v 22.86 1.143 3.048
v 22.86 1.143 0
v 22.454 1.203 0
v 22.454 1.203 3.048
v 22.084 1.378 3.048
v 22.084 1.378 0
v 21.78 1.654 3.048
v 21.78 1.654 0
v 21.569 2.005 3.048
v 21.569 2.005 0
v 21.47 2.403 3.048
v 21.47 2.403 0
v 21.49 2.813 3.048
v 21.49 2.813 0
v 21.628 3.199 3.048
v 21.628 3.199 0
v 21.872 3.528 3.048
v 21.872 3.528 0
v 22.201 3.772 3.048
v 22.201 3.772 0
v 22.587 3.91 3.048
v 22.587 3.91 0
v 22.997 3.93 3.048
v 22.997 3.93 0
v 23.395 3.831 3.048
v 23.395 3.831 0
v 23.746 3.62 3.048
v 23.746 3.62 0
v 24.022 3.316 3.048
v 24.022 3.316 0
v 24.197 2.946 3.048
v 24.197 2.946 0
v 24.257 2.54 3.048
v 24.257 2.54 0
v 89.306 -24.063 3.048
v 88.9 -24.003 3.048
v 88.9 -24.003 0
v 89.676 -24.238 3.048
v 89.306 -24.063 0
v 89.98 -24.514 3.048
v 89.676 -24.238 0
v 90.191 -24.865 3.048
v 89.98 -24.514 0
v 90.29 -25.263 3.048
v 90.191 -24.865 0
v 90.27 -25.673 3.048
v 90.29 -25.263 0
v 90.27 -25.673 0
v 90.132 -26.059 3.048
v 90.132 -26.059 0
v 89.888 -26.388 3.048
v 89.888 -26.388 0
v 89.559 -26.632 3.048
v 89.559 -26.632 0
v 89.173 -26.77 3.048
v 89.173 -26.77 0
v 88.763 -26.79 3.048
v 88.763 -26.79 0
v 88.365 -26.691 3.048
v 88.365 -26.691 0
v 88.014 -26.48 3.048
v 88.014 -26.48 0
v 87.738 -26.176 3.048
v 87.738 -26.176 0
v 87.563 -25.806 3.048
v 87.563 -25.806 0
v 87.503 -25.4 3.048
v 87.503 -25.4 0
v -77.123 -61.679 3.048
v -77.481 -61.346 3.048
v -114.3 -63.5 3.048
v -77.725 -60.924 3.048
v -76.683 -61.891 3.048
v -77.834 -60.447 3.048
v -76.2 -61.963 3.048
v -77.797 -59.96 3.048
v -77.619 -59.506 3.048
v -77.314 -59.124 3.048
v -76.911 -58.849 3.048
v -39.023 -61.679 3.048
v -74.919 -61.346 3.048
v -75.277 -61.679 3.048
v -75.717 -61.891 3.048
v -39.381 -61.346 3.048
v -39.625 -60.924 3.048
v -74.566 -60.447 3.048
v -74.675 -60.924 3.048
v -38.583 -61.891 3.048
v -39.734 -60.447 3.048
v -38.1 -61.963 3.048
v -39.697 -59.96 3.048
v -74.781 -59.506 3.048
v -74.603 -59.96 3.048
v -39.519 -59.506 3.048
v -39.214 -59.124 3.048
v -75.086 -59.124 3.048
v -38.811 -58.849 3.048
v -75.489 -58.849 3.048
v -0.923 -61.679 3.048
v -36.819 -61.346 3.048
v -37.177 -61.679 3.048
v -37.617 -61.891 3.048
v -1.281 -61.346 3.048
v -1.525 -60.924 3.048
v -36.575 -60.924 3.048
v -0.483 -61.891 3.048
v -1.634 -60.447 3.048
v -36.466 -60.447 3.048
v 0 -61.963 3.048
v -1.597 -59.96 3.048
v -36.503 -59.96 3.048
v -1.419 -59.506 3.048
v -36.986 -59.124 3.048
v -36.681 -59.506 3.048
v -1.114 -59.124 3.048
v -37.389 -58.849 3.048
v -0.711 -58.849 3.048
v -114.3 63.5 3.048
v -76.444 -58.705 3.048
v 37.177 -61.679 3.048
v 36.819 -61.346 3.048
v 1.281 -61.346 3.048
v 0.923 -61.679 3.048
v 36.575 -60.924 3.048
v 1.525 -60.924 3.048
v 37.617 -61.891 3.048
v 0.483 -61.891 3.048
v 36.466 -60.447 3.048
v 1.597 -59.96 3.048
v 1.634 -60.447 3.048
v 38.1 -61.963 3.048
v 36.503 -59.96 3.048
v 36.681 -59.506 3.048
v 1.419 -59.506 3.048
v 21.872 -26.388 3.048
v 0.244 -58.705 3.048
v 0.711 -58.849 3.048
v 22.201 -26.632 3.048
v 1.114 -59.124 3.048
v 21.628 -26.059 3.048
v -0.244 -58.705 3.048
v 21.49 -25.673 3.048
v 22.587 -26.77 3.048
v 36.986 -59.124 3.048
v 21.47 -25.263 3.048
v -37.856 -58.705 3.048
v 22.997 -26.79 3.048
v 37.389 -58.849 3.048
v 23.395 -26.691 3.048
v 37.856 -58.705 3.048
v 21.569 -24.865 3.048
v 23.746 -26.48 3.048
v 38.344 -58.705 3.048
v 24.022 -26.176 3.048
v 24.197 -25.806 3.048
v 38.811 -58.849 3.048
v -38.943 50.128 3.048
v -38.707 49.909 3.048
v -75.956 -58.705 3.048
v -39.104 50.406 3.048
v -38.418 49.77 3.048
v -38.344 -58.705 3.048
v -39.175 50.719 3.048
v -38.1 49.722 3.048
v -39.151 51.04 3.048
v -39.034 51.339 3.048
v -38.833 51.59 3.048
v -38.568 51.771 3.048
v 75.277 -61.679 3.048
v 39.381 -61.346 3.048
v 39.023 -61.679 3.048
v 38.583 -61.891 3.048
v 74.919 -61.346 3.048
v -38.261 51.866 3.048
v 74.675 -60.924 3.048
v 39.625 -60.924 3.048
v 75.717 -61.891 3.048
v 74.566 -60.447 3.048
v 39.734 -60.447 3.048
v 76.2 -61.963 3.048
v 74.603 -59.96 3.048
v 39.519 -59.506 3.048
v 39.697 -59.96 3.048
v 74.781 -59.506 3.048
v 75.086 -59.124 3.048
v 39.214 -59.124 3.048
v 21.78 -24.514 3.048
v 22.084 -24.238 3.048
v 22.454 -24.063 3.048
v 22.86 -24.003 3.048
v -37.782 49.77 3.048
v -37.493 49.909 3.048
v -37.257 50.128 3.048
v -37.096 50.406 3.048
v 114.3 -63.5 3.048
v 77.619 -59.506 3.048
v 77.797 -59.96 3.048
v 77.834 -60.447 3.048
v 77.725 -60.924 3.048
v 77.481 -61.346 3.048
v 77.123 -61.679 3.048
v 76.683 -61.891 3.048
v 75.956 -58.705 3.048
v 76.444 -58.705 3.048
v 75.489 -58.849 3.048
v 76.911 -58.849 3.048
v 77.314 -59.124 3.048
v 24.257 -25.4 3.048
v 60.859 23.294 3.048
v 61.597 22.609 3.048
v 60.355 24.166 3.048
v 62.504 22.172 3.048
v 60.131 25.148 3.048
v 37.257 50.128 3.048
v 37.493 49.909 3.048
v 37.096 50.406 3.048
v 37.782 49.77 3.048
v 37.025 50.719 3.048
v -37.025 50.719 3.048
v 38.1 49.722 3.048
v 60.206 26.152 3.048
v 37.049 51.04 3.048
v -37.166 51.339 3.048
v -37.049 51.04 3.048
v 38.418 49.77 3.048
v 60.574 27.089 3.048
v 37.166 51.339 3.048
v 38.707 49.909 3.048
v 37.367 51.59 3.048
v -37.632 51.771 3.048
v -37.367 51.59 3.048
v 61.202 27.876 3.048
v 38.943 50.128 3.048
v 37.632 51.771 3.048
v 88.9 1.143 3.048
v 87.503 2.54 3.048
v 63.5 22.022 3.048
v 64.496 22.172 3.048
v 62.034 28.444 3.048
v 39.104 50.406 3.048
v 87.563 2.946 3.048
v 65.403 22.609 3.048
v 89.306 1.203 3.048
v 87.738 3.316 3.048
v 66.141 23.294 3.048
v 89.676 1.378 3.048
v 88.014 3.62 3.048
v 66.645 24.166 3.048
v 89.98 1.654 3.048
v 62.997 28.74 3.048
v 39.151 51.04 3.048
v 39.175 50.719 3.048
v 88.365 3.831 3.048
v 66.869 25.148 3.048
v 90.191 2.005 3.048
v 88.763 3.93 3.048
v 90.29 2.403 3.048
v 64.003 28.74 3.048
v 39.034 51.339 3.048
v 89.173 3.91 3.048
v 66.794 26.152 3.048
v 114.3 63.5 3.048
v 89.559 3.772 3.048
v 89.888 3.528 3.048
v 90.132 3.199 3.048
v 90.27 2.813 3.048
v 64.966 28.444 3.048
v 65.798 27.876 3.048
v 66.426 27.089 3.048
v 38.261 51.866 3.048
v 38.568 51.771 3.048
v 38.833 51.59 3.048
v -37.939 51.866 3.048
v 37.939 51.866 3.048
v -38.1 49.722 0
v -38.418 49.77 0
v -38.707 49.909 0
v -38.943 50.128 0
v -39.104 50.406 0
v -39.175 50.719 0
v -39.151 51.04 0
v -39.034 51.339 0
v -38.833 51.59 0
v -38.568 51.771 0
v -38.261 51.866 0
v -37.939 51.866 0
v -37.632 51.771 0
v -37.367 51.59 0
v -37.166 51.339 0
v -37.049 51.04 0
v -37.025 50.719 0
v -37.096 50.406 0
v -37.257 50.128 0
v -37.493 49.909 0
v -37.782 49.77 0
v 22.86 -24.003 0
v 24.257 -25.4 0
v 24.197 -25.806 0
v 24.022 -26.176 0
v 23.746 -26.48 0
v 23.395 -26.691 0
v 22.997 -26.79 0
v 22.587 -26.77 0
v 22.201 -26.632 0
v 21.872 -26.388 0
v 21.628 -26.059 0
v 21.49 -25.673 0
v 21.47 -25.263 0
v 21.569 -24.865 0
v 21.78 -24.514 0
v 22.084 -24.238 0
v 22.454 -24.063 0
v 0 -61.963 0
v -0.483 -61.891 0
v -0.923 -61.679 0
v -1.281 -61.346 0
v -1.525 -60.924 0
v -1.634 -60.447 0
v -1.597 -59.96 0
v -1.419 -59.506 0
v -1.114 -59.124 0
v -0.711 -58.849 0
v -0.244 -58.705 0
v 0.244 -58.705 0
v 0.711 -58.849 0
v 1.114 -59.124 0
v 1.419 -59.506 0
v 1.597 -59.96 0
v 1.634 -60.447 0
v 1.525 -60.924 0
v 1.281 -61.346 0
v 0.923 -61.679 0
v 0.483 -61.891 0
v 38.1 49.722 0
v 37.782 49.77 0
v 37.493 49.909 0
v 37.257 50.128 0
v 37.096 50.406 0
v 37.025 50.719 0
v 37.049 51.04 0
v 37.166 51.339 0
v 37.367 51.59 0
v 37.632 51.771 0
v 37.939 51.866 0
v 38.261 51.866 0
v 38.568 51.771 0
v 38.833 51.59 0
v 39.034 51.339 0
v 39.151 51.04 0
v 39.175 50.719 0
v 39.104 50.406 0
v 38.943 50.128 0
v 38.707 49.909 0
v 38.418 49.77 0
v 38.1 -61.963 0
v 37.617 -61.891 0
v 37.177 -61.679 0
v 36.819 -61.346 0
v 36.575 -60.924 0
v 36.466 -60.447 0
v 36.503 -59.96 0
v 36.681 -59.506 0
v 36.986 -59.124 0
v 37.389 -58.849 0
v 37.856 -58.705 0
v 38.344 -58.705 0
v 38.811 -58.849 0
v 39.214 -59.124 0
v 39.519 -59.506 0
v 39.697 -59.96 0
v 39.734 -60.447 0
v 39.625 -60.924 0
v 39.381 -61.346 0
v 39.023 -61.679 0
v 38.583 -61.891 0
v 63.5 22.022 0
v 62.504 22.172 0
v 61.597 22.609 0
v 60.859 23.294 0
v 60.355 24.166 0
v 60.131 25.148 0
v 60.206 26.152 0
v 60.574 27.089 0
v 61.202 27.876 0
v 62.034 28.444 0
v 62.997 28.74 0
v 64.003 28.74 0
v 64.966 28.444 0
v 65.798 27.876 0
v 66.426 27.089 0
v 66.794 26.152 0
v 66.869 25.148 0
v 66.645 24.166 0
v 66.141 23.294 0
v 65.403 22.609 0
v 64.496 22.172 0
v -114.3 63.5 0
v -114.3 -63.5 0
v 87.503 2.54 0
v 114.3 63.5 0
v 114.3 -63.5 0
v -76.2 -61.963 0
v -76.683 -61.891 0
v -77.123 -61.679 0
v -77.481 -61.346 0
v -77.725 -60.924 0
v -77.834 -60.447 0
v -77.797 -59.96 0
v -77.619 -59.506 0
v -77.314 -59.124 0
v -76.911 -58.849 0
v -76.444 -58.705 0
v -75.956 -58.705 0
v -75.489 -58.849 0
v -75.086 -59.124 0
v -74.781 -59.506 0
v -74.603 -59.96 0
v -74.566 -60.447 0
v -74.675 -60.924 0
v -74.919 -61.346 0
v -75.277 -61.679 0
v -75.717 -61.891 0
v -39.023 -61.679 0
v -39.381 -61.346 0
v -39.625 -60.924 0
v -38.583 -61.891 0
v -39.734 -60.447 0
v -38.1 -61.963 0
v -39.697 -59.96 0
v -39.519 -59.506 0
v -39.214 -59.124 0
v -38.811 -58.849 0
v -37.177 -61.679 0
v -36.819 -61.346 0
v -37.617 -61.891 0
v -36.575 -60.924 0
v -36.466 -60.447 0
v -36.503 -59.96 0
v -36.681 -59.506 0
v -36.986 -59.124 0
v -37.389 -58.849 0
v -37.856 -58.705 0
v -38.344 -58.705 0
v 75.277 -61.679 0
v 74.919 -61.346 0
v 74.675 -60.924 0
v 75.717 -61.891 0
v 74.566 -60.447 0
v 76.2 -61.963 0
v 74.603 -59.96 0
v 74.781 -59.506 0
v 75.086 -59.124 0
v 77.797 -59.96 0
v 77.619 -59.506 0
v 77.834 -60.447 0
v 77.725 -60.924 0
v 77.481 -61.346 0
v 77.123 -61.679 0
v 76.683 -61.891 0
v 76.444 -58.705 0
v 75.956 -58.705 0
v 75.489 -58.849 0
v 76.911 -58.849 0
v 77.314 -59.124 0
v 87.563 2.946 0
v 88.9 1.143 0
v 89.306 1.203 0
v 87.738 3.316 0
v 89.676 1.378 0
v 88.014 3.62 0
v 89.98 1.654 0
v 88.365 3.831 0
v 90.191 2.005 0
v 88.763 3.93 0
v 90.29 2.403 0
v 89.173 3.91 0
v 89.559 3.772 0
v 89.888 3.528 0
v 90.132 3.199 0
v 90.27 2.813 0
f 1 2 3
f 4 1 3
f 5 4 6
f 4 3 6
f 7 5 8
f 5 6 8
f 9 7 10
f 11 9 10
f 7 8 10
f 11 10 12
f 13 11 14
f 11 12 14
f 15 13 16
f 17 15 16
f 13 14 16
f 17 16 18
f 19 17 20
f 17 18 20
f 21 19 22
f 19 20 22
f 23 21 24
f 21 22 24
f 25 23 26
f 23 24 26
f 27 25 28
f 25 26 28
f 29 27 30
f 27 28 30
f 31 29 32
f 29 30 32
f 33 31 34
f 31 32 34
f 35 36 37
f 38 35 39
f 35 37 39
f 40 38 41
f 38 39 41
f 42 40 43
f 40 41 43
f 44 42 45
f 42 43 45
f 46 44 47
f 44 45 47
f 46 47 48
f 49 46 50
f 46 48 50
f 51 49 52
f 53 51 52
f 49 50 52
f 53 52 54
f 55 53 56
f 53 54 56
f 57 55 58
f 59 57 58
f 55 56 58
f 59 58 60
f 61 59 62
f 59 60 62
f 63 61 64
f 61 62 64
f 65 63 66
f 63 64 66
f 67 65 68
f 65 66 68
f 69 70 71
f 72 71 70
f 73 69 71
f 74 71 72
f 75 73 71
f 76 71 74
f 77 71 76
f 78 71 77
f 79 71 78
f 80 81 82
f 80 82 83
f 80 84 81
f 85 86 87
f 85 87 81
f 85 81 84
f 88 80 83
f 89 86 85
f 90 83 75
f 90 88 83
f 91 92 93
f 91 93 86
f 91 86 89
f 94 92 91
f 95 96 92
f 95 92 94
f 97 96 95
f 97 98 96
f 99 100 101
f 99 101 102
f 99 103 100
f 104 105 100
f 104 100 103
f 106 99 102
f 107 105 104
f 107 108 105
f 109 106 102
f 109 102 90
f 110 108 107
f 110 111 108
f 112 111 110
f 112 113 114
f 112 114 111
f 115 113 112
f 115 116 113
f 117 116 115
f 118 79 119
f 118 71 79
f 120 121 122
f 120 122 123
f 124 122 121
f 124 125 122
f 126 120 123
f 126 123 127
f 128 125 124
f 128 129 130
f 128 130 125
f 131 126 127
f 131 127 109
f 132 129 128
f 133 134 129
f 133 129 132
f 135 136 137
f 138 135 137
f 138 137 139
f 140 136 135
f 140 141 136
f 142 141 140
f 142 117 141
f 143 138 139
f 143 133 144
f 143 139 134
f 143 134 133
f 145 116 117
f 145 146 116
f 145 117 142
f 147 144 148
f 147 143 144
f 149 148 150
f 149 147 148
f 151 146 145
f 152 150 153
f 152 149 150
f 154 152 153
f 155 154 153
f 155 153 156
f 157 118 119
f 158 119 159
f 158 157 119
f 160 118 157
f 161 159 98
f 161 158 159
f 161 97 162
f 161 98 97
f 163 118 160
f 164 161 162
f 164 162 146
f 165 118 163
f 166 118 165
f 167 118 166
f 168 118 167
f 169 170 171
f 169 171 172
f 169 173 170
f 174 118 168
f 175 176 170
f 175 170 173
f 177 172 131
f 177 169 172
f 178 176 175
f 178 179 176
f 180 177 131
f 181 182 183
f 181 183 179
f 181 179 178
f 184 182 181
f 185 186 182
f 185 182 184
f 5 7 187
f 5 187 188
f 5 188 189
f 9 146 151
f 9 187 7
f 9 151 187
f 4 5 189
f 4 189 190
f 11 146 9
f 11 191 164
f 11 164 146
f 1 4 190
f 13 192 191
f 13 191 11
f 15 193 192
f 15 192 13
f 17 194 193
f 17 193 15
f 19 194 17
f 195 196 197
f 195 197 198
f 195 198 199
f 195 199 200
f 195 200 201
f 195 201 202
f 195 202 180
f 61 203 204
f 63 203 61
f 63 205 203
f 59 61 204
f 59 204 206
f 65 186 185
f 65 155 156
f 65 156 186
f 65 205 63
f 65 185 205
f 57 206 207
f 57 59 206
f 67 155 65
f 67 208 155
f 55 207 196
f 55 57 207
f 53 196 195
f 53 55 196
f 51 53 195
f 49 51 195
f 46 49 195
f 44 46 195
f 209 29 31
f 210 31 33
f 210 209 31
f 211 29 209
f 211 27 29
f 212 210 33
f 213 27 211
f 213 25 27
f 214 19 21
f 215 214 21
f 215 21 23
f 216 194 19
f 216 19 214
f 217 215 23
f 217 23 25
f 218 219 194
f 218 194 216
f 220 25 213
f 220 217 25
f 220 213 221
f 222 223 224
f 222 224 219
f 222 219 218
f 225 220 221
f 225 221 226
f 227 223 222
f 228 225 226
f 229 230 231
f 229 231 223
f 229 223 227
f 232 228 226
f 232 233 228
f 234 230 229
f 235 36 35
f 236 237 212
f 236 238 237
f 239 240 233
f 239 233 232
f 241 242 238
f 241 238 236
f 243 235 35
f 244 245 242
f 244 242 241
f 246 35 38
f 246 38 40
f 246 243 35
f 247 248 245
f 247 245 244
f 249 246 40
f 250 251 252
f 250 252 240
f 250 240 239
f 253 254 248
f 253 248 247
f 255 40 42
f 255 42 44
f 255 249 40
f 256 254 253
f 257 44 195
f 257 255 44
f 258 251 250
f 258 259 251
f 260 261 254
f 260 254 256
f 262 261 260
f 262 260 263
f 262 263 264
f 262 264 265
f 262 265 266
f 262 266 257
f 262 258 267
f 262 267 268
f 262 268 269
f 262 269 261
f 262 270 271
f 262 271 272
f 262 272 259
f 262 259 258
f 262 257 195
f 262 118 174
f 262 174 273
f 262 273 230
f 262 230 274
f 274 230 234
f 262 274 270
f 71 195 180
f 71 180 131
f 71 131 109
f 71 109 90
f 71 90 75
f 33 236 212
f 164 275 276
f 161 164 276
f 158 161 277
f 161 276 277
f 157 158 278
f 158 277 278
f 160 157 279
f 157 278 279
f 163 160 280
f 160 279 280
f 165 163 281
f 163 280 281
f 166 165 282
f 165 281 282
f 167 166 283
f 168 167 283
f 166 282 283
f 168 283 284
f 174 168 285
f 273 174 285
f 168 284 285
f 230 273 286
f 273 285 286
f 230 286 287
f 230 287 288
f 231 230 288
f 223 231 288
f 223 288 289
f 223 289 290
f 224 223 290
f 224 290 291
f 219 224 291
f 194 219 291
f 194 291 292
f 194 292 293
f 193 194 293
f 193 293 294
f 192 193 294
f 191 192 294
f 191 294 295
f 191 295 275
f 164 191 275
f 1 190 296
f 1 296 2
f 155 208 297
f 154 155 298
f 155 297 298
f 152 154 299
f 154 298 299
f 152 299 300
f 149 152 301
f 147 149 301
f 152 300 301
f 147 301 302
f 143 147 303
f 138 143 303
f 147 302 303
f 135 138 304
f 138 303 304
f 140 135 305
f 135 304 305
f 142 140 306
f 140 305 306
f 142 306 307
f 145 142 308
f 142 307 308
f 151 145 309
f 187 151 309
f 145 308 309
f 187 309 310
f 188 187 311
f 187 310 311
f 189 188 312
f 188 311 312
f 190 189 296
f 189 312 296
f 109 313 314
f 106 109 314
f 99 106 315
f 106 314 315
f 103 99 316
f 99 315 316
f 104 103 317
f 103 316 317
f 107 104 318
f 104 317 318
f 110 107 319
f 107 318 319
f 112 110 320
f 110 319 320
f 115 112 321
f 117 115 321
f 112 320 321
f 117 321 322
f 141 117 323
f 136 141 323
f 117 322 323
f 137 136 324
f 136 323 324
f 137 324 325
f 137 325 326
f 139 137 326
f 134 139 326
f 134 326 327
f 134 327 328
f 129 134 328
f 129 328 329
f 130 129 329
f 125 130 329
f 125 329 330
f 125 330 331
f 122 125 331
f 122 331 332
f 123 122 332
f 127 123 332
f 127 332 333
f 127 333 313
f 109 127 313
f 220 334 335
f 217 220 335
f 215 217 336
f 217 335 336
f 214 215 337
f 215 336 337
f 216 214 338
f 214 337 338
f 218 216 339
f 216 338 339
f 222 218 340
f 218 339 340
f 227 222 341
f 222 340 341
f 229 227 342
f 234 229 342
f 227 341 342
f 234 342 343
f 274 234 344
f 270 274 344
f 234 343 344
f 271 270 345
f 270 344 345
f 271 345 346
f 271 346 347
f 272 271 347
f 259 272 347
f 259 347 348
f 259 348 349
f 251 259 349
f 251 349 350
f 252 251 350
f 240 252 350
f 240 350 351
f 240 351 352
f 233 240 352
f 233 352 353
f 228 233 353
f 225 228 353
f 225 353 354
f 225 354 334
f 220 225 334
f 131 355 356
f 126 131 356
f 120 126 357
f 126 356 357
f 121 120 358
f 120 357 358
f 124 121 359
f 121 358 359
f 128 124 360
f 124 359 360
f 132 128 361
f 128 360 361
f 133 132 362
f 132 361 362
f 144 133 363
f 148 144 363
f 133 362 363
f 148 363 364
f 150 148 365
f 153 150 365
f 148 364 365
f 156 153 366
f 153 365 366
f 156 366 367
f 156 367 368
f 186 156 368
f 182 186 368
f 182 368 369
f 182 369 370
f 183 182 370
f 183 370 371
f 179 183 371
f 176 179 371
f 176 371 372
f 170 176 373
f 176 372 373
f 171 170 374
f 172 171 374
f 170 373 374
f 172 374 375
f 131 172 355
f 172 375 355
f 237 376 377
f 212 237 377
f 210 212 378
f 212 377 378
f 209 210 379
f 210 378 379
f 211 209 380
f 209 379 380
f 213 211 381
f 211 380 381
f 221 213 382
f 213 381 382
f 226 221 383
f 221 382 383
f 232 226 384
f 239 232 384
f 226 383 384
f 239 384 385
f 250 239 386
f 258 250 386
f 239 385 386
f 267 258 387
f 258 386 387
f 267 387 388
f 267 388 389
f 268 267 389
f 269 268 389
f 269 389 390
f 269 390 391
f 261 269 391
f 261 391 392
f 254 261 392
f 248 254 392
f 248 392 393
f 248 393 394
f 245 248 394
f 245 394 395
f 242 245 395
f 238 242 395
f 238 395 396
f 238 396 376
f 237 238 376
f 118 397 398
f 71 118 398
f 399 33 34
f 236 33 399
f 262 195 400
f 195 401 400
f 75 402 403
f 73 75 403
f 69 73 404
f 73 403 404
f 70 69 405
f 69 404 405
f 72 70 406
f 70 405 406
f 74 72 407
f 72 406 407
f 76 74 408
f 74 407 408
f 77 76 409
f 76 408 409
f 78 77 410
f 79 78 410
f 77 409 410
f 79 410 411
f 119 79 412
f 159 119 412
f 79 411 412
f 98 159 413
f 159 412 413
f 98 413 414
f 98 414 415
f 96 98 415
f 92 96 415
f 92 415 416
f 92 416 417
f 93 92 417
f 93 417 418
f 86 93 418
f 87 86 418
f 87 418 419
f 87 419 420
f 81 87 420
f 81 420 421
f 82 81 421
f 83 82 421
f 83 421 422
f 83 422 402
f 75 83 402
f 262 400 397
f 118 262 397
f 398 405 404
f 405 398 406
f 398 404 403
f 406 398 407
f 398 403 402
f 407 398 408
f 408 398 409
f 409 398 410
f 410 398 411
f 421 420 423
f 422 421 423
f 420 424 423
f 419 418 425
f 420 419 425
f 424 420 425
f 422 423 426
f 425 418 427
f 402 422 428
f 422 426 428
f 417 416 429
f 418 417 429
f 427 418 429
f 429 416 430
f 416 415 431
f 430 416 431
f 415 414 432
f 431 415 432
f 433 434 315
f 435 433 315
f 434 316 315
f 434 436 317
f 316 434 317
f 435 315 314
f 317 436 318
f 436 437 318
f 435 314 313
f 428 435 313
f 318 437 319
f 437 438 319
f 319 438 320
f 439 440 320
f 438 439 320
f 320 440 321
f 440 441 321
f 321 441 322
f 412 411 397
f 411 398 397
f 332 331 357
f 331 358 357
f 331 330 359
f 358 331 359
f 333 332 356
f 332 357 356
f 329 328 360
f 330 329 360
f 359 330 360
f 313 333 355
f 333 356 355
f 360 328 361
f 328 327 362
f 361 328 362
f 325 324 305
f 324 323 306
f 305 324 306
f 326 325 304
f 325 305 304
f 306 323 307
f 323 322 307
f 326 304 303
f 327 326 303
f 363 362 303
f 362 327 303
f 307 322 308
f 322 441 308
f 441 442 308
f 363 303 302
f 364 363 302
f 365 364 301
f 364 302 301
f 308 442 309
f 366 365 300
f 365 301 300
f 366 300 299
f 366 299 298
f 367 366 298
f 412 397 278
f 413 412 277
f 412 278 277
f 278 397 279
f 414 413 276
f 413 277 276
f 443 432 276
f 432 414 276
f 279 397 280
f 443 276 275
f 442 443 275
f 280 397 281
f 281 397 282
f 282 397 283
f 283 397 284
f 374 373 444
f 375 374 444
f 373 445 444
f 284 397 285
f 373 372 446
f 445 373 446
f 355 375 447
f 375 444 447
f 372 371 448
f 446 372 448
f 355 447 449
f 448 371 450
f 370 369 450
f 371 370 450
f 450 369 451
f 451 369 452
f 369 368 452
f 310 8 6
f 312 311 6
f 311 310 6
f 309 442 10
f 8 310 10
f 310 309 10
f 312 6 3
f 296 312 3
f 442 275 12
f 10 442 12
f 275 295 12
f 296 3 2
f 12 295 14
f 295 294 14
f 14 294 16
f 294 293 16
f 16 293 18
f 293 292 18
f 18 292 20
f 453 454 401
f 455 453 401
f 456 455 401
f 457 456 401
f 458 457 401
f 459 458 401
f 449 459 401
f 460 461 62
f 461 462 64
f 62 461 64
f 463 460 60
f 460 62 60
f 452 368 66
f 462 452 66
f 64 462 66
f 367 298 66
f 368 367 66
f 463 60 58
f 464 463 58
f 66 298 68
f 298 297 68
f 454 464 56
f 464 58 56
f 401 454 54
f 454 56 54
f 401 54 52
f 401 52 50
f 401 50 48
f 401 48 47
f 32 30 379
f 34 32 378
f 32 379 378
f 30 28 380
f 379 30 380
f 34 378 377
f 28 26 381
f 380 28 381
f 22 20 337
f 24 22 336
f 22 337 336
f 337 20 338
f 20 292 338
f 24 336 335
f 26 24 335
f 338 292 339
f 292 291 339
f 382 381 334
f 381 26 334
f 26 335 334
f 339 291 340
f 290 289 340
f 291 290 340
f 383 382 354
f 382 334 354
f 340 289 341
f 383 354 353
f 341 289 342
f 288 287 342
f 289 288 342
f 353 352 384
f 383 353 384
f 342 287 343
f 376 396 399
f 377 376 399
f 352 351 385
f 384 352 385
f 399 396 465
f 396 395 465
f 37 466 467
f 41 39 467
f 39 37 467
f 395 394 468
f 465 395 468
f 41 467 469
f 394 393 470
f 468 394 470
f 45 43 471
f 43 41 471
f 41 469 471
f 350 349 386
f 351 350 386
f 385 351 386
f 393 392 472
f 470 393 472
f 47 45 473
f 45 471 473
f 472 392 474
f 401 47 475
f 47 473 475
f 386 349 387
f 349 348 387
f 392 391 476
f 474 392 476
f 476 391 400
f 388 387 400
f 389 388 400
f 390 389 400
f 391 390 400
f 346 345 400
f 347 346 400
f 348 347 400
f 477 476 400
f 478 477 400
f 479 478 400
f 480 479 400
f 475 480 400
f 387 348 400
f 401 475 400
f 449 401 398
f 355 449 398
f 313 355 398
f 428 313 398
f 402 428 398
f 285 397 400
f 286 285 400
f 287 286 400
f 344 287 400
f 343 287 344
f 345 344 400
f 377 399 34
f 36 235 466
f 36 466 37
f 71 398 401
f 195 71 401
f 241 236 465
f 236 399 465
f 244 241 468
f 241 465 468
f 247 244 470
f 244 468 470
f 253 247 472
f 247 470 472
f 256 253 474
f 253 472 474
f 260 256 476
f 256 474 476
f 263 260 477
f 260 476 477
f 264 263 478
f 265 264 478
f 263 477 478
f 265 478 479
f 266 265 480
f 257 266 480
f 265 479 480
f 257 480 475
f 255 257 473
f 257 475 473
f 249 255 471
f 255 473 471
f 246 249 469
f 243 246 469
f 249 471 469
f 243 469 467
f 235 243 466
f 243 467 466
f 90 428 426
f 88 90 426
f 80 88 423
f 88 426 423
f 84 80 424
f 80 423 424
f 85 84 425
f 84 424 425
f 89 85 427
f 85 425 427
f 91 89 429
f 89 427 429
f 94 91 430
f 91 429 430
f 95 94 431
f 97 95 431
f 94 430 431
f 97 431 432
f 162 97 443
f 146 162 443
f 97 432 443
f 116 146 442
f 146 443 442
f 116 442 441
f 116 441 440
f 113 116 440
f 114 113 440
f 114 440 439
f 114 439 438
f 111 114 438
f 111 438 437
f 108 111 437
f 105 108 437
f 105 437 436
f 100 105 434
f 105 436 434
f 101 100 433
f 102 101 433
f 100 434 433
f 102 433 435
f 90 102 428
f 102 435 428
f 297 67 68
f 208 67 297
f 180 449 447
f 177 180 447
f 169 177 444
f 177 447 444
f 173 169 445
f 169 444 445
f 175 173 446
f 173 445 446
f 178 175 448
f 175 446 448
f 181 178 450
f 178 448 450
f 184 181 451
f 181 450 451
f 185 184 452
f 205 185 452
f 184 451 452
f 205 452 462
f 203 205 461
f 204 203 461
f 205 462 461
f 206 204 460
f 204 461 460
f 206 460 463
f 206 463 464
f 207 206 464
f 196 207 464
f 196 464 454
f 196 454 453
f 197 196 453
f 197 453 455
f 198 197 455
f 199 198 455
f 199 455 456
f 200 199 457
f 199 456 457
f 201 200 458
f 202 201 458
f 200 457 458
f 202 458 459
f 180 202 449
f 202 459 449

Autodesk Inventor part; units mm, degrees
ref_plane "YZ Plane" through (0, 0, 0) normal (1, 0, 0) x (0, 1, 0)
ref_plane "XZ Plane" through (0, 0, 0) normal (0, 1, 0) x (-1, 0, 0)
ref_plane "XY Plane" through (0, 0, 0) normal (0, 0, 1) x (1, 0, 0)
sketch "Sketch1" plane through (0, 0, 0) normal (0, 0, 1) x (1, 0, 0)
  line L0 (114.3, 63.5) -> (-114.3, 63.5)
  line L1 (-114.3, 63.5) -> (-114.3, -63.5)
  line L2 (-114.3, -63.5) -> (114.3, -63.5)
  line L3 (114.3, -63.5) -> (114.3, 63.5)
  point P0 (0, 0)
  dimension "d0" = 228.6
  dimension "d1" = 127
extrude "Plate1" add sketch "Sketch1" along normal blind 3.048
sketch "Sketch2" plane through (0, 0, 3.048) normal (0, 0, 1) x (1, 0, 0)
  line L0 (-114.3, -63.5) -> (114.3, -63.5) projected
  line L1 (114.3, -63.5) -> (114.3, -60.325)
  line L2 (114.3, -63.5) -> (114.3, 63.5) projected
  line L3 (114.3, -60.325) -> (76.2, -60.325)
  line L4 (76.2, -60.325) -> (38.1, -60.325)
  line L5 (38.1, -60.325) -> (0, -60.325)
  line L6 (0, -60.325) -> (-38.1, -60.325)
  line L7 (-38.1, -60.325) -> (-76.2, -60.325)
  line L8 (-76.2, -60.325) -> (-114.3, -60.325)
  line L9 (-114.3, 63.5) -> (-114.3, -63.5) projected
  point P0 (0, 0)
  dimension "d3" = 3.175
  dimension "d4" = 38.1
  dimension "d5" = 38.1
  dimension "d6" = 38.1
  dimension "d7" = 38.1
hole "Hole1" at (-76.2, -60.325, 3.048) at (-38.1, -60.325, 3.048) at (0, -60.325, 3.048) at (38.1, -60.325, 3.048) at (76.2, -60.325, 3.048) direction (0, 0, -1) diameter 3.2766 depth 3.048 clearance for "Hex Machine Screw" size "#4" standard "Ansi Unified Screw Threads"
sketch "Sketch3" plane through (0, 0, 3.048) normal (0, 0, 1) x (1, 0, 0)
  line L0 (114.3, -63.5) -> (114.3, -25.4)
  line L1 (114.3, -63.5) -> (114.3, 63.5) projected
  line L2 (114.3, -25.4) -> (88.9, -25.4)
  line L3 (88.9, -25.4) -> (22.86, -25.4)
  line L4 (22.86, -25.4) -> (22.86, 2.54)
  line L5 (22.86, 2.54) -> (88.9, 2.54)
  line L6 (88.9, 2.54) -> (88.9, -25.4)
  point P0 (0, 0)
  dimension "d15" = 38.1
  dimension "d16" = 25.4
  dimension "d17" = 66.04
  dimension "d18" = 27.94
extrude "Cut1" cut sketch "Sketch3" against normal blind 3.048
sketch "Sketch4" plane through (0, 0, 3.048) normal (0, 0, 1) x (1, 0, 0)
  line L0 (114.3, 63.5) -> (-114.3, 63.5) projected
  line L1 (-114.3, 63.5) -> (-114.3, 50.8)
  line L2 (-114.3, -63.5) -> (-114.3, 63.5) projected
  line L3 (-114.3, 50.8) -> (-38.1, 50.8)
  line L4 (-38.1, 50.8) -> (38.1, 50.8)
  line L5 (38.1, 50.8) -> (114.3, 50.8)
  point P0 (0, 0)
  dimension "d21" = 12.7
  dimension "d22" = 76.2
  dimension "d23" = 76.2
  dimension "d24" = 76.2
hole "Hole2" at (-38.1, 50.8, 3.048) at (38.1, 50.8, 3.048) direction (0, 0, -1) diameter 2.1565 end through all thread size "4-40 UNC" class "2B" standard "ANSI Unified Screw Threads"
sketch "Sketch5" plane through (0, 0, 3.048) normal (0, 0, 1) x (1, 0, 0)
  circle A0 centre (-38.1, 50.8) radius 1.0782 projected
  circle A1 centre (38.1, 50.8) radius 1.0782 projected
  line L0 (22.86, 2.54) -> (88.9, 2.54) projected
  line L1 (88.9, 2.54) -> (88.9, -25.4) projected
  line L2 (88.9, -25.4) -> (22.86, -25.4) projected
  line L3 (22.86, -25.4) -> (22.86, 2.54) projected
  circle A2 centre (38.1, -60.325) radius 1.6383 projected
  circle A3 centre (-38.1, -60.325) radius 1.6383 projected
  circle A4 centre (-76.2, -60.325) radius 1.6383 projected
  circle A5 centre (0, -60.325) radius 1.6383 projected
  circle A6 centre (76.2, -60.325) radius 1.6383 projected
  line L4 (114.3, 63.5) -> (114.3, -63.5) projected
  line L5 (-114.3, 63.5) -> (114.3, 63.5) projected
  line L6 (-114.3, -63.5) -> (-114.3, 63.5) projected
  line L7 (114.3, -63.5) -> (-114.3, -63.5) projected
  point P0 (0, 0)
hole "Hole3" at (22.86, 2.54, 3.048) at (88.9, 2.54, 3.048) at (88.9, -25.4, 3.048) at (22.86, -25.4, 3.048) direction (0, 0, -1) diameter 2.794 depth 3.048 clearance for "Flat Head Machine Screw (82)" size "#3" standard "Ansi Unified Screw Threads"
sketch "Sketch6" plane through (0, 0, 3.048) normal (0, 0, 1) x (1, 0, 0)
  line L0 (114.3, -63.5) -> (-114.3, -63.5) projected
  line L1 (114.3, -63.5) -> (63.5, -63.5)
  line L2 (63.5, -63.5) -> (63.5, 25.4)
  point P0 (0, 0)
  dimension "d39" = 50.8
  dimension "d40" = 88.9
hole "Hole4" at (63.5, 25.4, 3.048) direction (0, 0, -1) diameter 6.7564 depth 3.048 clearance for "Flat Head Machine Screw (82)" size "1/4" standard "Ansi Unified Screw Threads"
equation "\"d13\" = Thickness"
equation "\"d19\" = Thickness"
equation "\"d37\" = Thickness"
equation "\"d46\" = Thickness"
equation "\"d2\" = Thickness"
equation "\"BendRadius\" = Thickness"
equation "\"BendReliefWidth\" = Thickness"
equation "\"BendReliefDepth\" = 0.5 * Thickness"
equation "\"CornerReliefSize\" = 4 * Thickness"
equation "\"MinimumRemnant\" = 2 * Thickness"
equation "\"TransitionRadius\" = BendRadius"
equation "\"JacobiRadiusSize\" = BendRadius"
equation "\"GapSize\" = Thickness"
equation "\"Thickness\" = 3.048"
properties part number "sheetmetalright2.0"
